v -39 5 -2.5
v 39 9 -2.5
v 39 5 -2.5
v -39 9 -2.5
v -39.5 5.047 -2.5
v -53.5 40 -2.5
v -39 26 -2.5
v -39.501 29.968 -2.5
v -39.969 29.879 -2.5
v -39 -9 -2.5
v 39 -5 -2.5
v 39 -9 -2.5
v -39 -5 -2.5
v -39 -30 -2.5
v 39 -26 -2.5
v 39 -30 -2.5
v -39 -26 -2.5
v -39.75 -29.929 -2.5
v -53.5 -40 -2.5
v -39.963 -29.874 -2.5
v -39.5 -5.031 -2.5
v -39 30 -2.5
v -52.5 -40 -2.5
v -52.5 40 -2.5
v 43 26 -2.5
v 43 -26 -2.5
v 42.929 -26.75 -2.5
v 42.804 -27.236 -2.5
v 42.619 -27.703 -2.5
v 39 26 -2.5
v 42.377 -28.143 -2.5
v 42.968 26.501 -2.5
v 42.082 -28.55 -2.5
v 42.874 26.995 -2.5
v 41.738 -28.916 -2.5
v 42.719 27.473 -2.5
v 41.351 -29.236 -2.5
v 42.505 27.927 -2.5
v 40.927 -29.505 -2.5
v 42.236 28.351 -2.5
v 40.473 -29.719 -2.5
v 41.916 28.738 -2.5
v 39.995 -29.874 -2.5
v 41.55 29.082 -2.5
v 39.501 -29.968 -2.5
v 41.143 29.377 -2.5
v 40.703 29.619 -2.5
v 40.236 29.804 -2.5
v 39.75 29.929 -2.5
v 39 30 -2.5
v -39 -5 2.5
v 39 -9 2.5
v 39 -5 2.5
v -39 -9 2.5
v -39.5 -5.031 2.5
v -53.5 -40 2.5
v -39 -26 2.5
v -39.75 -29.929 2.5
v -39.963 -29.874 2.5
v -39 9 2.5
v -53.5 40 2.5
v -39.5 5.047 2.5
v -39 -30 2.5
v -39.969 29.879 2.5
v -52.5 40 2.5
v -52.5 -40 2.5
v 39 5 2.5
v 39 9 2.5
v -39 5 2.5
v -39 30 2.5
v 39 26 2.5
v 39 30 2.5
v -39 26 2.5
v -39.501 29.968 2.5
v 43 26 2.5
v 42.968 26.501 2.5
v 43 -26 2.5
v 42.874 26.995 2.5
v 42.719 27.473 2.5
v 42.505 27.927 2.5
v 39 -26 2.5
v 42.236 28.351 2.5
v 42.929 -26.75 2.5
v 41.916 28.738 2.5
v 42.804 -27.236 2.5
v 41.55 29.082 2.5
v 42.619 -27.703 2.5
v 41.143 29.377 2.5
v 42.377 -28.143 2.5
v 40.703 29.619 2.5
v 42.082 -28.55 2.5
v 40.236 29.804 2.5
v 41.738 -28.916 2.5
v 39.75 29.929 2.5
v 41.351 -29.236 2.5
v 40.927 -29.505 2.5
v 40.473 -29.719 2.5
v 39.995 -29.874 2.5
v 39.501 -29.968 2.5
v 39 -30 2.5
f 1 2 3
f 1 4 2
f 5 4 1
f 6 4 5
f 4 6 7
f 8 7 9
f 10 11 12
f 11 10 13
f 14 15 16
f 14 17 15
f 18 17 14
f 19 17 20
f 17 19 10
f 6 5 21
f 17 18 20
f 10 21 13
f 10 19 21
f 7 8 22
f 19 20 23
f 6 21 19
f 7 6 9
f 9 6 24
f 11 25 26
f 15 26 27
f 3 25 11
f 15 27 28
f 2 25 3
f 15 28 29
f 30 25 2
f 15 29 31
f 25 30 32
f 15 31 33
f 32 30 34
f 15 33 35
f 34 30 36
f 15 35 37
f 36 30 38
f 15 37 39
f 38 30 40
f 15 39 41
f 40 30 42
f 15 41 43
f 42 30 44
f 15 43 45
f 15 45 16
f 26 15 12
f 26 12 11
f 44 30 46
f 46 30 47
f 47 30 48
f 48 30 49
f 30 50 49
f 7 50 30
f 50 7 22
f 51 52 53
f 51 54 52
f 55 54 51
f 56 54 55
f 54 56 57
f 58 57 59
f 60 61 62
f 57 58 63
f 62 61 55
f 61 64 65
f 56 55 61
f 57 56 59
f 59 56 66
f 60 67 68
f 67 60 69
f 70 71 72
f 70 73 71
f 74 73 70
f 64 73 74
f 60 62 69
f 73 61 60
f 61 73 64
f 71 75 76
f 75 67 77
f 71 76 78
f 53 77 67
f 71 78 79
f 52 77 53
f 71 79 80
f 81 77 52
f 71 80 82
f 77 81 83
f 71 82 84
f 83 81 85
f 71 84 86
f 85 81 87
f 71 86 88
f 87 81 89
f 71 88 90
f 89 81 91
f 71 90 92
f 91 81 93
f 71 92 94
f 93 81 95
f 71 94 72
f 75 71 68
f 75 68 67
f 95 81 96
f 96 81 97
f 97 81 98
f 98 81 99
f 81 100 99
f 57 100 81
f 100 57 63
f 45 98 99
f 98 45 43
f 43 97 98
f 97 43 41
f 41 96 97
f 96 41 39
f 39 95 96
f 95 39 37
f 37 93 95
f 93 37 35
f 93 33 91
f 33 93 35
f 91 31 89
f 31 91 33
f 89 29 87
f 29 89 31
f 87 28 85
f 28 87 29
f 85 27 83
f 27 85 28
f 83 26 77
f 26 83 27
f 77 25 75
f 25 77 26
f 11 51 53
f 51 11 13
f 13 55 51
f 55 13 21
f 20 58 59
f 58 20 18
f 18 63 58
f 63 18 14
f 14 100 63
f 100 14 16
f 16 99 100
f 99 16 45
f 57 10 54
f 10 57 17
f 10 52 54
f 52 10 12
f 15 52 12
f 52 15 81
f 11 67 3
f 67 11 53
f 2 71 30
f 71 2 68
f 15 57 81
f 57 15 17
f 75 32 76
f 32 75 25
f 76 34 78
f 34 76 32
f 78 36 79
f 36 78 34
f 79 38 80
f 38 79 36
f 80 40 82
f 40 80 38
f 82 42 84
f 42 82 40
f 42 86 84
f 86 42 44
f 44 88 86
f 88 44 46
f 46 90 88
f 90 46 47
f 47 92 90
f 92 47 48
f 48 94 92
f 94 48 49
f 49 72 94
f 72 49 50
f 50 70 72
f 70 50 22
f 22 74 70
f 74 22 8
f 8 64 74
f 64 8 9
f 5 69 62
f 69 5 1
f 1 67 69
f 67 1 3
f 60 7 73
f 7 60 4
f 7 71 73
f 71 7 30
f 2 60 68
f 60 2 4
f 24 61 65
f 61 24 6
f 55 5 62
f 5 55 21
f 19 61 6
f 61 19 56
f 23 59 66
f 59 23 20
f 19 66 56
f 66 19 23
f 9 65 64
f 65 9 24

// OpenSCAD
// quality
$fn = 50;

// width of HDD case
hddWidth = 78;

// height of HDD case
hddHeight = 17;

// Thickness (height) of holder
thickness = 5;

// Wall thickness
wall = 4;

// Num of HDDs
count = 2;

// Spacing between HDDs
spacing = 10;

// Width of holder's base for one HDD
baseWidth = 30;

// Elevation of bottom of HDD
elevation = 10;


module holdersTopBase() {
  for (i = [0:count-1]) {
    translate([0, i * (spacing + hddHeight + 2*wall), 0])
    linear_extrude (height=thickness)
    difference() {
      offset (r=wall) square ([hddWidth, hddHeight], center=true);
      square ([hddWidth, hddHeight], center=true);
    }
  }
}

module holdersTop() {
  translate([0, -((count - 1) * (spacing + hddHeight + 2*wall))/2, -thickness/2])
  holdersTopBase();
}

module base() {
  hull() {
    translate([-hddWidth/2-1, 0, 0])
    cube ([1, (count - 1) * spacing + (count * (hddHeight + 2*wall)) - 1, thickness], center=true);

    translate([-hddWidth/2-wall-elevation, 0, 0])
    cube([1, count*(baseWidth + spacing), thickness], center=true);
  }
  
  if (count > 1) {
    translate([hddWidth/2+wall/2, 0, 0])
    cube ([wall, (count - 1) * (spacing + hddHeight + 2*wall), thickness], center=true);
  }
}

union() {
  holdersTop();
  base();
}
